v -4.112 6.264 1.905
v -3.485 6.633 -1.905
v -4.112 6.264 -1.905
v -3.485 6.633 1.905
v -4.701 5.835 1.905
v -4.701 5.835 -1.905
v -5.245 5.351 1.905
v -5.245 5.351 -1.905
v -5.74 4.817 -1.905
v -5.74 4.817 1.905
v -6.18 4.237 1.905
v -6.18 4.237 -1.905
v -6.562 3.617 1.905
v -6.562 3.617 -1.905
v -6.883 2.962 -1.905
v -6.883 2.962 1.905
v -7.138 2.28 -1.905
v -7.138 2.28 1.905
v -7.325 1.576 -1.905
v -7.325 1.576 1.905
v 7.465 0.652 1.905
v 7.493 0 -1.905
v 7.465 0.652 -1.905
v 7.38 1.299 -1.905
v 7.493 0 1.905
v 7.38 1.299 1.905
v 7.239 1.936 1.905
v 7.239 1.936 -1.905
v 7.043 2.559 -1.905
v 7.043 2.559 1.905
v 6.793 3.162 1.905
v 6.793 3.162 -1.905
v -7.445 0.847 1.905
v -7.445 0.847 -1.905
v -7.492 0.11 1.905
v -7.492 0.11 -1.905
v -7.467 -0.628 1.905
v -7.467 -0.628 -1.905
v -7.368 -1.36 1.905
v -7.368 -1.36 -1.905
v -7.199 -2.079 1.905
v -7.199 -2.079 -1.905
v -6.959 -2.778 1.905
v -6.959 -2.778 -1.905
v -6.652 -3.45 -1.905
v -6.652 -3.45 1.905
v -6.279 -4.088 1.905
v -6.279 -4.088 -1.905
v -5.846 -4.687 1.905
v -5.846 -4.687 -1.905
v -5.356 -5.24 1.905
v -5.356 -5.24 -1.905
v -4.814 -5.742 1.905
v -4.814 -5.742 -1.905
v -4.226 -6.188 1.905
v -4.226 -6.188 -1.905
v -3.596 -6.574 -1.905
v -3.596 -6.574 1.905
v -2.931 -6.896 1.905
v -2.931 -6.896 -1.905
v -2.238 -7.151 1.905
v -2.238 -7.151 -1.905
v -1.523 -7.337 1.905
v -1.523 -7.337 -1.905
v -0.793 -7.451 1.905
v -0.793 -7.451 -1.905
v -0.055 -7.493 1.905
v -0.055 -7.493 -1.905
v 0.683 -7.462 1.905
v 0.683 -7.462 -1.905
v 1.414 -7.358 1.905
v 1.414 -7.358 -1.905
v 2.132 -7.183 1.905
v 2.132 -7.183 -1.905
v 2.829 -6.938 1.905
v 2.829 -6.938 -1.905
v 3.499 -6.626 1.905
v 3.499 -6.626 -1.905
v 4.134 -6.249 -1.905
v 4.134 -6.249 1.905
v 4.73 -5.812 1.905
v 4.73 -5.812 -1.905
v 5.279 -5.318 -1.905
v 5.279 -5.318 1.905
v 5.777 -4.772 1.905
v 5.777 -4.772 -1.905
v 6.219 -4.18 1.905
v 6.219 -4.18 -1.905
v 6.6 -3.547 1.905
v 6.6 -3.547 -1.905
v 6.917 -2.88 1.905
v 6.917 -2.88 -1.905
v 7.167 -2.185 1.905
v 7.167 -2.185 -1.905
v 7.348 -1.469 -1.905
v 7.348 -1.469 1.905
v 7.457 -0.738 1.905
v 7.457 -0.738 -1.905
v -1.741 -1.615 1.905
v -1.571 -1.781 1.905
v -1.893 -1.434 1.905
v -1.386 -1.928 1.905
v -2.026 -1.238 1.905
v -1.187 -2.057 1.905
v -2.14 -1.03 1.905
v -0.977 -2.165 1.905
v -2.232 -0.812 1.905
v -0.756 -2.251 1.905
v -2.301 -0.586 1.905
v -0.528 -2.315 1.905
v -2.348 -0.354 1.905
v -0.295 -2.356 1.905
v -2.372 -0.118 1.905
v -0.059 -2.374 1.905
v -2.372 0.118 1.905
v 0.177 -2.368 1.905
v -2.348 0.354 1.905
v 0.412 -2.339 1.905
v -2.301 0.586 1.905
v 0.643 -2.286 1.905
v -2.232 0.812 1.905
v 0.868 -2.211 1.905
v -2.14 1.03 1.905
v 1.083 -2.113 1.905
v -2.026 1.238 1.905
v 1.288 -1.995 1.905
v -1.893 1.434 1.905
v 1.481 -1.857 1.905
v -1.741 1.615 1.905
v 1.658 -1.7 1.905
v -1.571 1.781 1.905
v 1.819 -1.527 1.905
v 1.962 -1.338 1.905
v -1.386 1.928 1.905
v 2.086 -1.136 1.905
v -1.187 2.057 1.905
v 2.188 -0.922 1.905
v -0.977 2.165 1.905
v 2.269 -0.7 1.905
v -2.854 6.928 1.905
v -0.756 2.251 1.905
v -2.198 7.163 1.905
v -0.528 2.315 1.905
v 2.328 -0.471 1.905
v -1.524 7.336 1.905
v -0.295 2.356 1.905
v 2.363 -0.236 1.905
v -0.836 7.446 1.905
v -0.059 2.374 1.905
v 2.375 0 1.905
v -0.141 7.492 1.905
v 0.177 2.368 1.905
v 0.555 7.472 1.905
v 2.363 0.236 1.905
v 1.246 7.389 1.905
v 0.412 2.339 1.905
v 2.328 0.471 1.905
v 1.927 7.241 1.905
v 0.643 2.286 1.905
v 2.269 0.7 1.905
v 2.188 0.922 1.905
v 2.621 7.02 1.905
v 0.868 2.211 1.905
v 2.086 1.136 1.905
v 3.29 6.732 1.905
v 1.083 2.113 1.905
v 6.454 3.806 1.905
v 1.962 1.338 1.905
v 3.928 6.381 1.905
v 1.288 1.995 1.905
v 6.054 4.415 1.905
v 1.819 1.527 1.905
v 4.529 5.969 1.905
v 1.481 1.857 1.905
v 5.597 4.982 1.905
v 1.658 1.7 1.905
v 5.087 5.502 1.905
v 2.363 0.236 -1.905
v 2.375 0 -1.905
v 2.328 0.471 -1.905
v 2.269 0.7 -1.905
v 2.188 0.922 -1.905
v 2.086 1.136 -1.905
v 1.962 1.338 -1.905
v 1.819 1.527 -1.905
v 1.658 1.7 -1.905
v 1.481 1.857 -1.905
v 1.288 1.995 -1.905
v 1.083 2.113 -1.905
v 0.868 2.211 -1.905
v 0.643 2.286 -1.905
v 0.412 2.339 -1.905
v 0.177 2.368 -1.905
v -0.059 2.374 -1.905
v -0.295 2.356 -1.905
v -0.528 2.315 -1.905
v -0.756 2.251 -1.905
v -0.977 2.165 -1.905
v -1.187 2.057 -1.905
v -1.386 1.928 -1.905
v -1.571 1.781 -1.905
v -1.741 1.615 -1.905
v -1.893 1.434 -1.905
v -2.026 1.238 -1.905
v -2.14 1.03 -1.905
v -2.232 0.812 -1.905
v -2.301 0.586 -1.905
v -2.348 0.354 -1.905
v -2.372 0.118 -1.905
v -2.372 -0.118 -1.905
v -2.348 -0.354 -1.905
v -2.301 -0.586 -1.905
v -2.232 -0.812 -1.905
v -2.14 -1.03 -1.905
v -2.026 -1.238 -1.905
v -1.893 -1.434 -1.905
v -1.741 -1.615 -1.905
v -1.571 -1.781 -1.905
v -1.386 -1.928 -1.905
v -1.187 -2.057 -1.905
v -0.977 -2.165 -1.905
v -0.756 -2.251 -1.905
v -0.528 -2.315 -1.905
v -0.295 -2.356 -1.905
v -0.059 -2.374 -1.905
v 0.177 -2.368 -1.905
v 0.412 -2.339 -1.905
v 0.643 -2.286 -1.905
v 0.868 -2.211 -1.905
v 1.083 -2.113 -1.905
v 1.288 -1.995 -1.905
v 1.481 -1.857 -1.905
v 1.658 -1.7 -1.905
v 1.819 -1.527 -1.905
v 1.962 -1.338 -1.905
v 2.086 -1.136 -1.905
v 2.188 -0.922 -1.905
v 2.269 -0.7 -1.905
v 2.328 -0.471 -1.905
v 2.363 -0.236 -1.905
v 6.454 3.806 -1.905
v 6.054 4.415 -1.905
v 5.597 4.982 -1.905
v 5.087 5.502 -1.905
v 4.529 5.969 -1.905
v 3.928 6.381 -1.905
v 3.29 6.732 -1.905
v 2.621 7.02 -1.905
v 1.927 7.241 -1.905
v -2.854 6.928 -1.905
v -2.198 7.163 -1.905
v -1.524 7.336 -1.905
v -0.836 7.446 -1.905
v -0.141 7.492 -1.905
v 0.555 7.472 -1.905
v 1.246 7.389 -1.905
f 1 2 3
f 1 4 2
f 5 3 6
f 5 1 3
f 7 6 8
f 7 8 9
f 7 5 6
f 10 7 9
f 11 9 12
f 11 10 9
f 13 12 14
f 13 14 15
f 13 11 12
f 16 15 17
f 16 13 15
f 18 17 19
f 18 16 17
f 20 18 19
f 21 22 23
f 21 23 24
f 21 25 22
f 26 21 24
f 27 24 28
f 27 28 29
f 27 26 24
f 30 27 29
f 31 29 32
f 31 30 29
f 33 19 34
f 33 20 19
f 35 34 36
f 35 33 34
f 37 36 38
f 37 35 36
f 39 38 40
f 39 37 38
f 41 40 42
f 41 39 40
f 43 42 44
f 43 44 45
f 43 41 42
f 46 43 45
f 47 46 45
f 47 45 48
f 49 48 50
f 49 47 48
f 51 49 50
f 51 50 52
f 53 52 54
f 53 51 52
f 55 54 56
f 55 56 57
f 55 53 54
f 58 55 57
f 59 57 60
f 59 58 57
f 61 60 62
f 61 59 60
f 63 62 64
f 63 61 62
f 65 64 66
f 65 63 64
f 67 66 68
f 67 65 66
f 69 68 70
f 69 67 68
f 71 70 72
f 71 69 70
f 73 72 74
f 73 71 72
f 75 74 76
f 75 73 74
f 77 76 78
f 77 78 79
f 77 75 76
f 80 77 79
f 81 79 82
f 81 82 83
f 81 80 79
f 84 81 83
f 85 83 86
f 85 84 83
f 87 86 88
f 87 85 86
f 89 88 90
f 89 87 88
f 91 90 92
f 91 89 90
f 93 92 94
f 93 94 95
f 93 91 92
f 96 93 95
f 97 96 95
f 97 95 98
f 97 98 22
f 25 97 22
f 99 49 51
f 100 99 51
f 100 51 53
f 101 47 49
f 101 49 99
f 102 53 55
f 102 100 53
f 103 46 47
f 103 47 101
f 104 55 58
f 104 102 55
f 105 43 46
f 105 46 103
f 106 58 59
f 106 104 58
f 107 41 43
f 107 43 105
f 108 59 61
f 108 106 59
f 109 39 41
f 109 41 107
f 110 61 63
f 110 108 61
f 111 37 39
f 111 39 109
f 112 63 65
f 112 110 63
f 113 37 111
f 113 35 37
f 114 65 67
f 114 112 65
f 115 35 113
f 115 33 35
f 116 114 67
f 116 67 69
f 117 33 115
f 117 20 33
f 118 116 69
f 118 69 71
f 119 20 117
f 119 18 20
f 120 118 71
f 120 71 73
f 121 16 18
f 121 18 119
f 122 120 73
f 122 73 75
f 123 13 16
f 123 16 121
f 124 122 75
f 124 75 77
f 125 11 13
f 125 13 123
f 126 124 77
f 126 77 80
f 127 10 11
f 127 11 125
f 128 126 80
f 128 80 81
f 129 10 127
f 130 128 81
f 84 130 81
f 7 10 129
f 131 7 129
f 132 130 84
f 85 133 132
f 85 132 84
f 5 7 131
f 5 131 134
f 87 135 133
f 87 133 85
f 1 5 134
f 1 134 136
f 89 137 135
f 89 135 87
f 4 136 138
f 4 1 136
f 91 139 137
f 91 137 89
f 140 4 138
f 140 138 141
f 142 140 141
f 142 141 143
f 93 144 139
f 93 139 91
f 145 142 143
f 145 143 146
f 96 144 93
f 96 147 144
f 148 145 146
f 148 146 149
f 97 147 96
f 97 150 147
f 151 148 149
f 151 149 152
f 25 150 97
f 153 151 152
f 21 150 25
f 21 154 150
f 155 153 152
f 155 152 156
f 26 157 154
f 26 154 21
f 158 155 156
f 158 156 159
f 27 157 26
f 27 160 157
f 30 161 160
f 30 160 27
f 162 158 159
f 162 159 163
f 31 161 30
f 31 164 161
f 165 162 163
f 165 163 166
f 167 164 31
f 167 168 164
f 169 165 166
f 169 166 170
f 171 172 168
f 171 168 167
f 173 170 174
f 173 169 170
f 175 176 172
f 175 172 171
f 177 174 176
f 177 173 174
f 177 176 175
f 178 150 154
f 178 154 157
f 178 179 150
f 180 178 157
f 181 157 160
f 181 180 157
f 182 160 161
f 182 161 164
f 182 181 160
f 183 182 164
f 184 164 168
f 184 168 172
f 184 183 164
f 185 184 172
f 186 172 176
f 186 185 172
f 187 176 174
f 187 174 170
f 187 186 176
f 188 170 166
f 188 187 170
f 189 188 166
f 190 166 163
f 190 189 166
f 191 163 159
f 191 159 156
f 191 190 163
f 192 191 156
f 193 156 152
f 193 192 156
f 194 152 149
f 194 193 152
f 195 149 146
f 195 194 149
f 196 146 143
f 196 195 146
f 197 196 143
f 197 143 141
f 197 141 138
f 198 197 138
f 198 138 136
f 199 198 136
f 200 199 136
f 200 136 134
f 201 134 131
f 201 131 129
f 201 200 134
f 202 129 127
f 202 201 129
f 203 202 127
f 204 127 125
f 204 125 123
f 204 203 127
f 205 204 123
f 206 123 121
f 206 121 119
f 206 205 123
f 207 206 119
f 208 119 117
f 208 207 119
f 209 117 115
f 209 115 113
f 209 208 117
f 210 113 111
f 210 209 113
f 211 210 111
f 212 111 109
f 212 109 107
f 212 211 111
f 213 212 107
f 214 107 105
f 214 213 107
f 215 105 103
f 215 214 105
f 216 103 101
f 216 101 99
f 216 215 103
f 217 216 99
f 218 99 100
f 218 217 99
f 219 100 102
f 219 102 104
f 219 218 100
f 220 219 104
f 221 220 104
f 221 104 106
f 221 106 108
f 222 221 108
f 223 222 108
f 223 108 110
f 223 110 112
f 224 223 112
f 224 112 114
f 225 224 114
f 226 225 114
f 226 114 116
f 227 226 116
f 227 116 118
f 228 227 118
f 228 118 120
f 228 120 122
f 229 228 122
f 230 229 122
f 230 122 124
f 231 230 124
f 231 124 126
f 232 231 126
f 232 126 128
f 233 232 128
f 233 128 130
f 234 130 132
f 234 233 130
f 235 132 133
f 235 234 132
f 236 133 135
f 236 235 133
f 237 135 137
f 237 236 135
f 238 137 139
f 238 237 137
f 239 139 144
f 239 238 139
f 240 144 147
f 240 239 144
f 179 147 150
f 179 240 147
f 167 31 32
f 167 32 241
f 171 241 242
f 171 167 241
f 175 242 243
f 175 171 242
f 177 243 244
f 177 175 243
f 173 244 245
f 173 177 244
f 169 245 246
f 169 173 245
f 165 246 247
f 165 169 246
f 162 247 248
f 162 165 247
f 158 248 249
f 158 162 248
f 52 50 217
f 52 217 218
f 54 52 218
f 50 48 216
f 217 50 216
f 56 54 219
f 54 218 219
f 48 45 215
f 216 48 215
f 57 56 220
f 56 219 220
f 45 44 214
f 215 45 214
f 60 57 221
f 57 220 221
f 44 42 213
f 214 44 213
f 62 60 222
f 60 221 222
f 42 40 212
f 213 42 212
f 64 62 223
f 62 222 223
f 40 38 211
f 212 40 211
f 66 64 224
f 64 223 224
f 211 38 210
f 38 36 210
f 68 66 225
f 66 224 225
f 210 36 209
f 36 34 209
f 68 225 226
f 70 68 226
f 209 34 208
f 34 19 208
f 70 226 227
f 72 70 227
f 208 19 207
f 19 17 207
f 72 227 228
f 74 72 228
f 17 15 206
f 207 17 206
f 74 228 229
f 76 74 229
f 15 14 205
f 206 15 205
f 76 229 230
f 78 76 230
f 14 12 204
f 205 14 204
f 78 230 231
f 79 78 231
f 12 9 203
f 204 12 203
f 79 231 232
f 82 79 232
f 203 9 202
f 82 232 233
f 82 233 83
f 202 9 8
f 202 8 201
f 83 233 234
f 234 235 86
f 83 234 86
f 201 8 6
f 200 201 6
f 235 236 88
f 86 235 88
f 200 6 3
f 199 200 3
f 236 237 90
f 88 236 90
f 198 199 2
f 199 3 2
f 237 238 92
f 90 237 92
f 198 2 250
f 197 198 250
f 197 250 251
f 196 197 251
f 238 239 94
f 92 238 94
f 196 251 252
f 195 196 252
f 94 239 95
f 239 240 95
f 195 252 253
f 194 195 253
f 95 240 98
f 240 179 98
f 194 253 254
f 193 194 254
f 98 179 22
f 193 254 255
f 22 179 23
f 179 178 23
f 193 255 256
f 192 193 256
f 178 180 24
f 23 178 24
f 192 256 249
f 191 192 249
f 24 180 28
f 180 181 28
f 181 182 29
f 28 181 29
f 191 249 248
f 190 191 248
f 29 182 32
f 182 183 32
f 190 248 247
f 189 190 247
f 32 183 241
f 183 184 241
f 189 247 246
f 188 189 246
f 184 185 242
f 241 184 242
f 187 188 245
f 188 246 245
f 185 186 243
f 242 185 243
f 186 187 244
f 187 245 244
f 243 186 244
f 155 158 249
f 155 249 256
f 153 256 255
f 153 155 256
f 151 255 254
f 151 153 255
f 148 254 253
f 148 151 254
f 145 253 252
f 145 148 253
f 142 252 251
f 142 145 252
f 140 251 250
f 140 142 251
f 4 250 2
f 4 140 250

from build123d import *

# Parameters (mm, degrees)
F0_R     = 2.3749
F1_DEPTH = 1.905


with BuildPart() as f1:
    # F0 (on Top) → F1 (new body, symmetric)
    with BuildSketch(Plane.XY):
        with BuildLine():
            ThreePointArc((7.493, 0), (7.31599, 1.619054), (6.793324, 3.161612))
            ThreePointArc((6.793324, 3.161612), (4.813653, 5.742281), (1.926984, 7.240979))
            ThreePointArc((1.926984, 7.240979), (-0.836016, 7.446216), (-3.484713, 6.633387))
            ThreePointArc((-3.484713, 6.633387), (-5.967172, 4.531876), (-7.325286, 1.576461))
            ThreePointArc((-7.325286, 1.576461), (-0.792679, -7.450954), (7.493, 0))
        make_face()
        Circle(F0_R, mode=Mode.SUBTRACT)
    extrude(amount=F1_DEPTH, both=True)


solid = f1.part
